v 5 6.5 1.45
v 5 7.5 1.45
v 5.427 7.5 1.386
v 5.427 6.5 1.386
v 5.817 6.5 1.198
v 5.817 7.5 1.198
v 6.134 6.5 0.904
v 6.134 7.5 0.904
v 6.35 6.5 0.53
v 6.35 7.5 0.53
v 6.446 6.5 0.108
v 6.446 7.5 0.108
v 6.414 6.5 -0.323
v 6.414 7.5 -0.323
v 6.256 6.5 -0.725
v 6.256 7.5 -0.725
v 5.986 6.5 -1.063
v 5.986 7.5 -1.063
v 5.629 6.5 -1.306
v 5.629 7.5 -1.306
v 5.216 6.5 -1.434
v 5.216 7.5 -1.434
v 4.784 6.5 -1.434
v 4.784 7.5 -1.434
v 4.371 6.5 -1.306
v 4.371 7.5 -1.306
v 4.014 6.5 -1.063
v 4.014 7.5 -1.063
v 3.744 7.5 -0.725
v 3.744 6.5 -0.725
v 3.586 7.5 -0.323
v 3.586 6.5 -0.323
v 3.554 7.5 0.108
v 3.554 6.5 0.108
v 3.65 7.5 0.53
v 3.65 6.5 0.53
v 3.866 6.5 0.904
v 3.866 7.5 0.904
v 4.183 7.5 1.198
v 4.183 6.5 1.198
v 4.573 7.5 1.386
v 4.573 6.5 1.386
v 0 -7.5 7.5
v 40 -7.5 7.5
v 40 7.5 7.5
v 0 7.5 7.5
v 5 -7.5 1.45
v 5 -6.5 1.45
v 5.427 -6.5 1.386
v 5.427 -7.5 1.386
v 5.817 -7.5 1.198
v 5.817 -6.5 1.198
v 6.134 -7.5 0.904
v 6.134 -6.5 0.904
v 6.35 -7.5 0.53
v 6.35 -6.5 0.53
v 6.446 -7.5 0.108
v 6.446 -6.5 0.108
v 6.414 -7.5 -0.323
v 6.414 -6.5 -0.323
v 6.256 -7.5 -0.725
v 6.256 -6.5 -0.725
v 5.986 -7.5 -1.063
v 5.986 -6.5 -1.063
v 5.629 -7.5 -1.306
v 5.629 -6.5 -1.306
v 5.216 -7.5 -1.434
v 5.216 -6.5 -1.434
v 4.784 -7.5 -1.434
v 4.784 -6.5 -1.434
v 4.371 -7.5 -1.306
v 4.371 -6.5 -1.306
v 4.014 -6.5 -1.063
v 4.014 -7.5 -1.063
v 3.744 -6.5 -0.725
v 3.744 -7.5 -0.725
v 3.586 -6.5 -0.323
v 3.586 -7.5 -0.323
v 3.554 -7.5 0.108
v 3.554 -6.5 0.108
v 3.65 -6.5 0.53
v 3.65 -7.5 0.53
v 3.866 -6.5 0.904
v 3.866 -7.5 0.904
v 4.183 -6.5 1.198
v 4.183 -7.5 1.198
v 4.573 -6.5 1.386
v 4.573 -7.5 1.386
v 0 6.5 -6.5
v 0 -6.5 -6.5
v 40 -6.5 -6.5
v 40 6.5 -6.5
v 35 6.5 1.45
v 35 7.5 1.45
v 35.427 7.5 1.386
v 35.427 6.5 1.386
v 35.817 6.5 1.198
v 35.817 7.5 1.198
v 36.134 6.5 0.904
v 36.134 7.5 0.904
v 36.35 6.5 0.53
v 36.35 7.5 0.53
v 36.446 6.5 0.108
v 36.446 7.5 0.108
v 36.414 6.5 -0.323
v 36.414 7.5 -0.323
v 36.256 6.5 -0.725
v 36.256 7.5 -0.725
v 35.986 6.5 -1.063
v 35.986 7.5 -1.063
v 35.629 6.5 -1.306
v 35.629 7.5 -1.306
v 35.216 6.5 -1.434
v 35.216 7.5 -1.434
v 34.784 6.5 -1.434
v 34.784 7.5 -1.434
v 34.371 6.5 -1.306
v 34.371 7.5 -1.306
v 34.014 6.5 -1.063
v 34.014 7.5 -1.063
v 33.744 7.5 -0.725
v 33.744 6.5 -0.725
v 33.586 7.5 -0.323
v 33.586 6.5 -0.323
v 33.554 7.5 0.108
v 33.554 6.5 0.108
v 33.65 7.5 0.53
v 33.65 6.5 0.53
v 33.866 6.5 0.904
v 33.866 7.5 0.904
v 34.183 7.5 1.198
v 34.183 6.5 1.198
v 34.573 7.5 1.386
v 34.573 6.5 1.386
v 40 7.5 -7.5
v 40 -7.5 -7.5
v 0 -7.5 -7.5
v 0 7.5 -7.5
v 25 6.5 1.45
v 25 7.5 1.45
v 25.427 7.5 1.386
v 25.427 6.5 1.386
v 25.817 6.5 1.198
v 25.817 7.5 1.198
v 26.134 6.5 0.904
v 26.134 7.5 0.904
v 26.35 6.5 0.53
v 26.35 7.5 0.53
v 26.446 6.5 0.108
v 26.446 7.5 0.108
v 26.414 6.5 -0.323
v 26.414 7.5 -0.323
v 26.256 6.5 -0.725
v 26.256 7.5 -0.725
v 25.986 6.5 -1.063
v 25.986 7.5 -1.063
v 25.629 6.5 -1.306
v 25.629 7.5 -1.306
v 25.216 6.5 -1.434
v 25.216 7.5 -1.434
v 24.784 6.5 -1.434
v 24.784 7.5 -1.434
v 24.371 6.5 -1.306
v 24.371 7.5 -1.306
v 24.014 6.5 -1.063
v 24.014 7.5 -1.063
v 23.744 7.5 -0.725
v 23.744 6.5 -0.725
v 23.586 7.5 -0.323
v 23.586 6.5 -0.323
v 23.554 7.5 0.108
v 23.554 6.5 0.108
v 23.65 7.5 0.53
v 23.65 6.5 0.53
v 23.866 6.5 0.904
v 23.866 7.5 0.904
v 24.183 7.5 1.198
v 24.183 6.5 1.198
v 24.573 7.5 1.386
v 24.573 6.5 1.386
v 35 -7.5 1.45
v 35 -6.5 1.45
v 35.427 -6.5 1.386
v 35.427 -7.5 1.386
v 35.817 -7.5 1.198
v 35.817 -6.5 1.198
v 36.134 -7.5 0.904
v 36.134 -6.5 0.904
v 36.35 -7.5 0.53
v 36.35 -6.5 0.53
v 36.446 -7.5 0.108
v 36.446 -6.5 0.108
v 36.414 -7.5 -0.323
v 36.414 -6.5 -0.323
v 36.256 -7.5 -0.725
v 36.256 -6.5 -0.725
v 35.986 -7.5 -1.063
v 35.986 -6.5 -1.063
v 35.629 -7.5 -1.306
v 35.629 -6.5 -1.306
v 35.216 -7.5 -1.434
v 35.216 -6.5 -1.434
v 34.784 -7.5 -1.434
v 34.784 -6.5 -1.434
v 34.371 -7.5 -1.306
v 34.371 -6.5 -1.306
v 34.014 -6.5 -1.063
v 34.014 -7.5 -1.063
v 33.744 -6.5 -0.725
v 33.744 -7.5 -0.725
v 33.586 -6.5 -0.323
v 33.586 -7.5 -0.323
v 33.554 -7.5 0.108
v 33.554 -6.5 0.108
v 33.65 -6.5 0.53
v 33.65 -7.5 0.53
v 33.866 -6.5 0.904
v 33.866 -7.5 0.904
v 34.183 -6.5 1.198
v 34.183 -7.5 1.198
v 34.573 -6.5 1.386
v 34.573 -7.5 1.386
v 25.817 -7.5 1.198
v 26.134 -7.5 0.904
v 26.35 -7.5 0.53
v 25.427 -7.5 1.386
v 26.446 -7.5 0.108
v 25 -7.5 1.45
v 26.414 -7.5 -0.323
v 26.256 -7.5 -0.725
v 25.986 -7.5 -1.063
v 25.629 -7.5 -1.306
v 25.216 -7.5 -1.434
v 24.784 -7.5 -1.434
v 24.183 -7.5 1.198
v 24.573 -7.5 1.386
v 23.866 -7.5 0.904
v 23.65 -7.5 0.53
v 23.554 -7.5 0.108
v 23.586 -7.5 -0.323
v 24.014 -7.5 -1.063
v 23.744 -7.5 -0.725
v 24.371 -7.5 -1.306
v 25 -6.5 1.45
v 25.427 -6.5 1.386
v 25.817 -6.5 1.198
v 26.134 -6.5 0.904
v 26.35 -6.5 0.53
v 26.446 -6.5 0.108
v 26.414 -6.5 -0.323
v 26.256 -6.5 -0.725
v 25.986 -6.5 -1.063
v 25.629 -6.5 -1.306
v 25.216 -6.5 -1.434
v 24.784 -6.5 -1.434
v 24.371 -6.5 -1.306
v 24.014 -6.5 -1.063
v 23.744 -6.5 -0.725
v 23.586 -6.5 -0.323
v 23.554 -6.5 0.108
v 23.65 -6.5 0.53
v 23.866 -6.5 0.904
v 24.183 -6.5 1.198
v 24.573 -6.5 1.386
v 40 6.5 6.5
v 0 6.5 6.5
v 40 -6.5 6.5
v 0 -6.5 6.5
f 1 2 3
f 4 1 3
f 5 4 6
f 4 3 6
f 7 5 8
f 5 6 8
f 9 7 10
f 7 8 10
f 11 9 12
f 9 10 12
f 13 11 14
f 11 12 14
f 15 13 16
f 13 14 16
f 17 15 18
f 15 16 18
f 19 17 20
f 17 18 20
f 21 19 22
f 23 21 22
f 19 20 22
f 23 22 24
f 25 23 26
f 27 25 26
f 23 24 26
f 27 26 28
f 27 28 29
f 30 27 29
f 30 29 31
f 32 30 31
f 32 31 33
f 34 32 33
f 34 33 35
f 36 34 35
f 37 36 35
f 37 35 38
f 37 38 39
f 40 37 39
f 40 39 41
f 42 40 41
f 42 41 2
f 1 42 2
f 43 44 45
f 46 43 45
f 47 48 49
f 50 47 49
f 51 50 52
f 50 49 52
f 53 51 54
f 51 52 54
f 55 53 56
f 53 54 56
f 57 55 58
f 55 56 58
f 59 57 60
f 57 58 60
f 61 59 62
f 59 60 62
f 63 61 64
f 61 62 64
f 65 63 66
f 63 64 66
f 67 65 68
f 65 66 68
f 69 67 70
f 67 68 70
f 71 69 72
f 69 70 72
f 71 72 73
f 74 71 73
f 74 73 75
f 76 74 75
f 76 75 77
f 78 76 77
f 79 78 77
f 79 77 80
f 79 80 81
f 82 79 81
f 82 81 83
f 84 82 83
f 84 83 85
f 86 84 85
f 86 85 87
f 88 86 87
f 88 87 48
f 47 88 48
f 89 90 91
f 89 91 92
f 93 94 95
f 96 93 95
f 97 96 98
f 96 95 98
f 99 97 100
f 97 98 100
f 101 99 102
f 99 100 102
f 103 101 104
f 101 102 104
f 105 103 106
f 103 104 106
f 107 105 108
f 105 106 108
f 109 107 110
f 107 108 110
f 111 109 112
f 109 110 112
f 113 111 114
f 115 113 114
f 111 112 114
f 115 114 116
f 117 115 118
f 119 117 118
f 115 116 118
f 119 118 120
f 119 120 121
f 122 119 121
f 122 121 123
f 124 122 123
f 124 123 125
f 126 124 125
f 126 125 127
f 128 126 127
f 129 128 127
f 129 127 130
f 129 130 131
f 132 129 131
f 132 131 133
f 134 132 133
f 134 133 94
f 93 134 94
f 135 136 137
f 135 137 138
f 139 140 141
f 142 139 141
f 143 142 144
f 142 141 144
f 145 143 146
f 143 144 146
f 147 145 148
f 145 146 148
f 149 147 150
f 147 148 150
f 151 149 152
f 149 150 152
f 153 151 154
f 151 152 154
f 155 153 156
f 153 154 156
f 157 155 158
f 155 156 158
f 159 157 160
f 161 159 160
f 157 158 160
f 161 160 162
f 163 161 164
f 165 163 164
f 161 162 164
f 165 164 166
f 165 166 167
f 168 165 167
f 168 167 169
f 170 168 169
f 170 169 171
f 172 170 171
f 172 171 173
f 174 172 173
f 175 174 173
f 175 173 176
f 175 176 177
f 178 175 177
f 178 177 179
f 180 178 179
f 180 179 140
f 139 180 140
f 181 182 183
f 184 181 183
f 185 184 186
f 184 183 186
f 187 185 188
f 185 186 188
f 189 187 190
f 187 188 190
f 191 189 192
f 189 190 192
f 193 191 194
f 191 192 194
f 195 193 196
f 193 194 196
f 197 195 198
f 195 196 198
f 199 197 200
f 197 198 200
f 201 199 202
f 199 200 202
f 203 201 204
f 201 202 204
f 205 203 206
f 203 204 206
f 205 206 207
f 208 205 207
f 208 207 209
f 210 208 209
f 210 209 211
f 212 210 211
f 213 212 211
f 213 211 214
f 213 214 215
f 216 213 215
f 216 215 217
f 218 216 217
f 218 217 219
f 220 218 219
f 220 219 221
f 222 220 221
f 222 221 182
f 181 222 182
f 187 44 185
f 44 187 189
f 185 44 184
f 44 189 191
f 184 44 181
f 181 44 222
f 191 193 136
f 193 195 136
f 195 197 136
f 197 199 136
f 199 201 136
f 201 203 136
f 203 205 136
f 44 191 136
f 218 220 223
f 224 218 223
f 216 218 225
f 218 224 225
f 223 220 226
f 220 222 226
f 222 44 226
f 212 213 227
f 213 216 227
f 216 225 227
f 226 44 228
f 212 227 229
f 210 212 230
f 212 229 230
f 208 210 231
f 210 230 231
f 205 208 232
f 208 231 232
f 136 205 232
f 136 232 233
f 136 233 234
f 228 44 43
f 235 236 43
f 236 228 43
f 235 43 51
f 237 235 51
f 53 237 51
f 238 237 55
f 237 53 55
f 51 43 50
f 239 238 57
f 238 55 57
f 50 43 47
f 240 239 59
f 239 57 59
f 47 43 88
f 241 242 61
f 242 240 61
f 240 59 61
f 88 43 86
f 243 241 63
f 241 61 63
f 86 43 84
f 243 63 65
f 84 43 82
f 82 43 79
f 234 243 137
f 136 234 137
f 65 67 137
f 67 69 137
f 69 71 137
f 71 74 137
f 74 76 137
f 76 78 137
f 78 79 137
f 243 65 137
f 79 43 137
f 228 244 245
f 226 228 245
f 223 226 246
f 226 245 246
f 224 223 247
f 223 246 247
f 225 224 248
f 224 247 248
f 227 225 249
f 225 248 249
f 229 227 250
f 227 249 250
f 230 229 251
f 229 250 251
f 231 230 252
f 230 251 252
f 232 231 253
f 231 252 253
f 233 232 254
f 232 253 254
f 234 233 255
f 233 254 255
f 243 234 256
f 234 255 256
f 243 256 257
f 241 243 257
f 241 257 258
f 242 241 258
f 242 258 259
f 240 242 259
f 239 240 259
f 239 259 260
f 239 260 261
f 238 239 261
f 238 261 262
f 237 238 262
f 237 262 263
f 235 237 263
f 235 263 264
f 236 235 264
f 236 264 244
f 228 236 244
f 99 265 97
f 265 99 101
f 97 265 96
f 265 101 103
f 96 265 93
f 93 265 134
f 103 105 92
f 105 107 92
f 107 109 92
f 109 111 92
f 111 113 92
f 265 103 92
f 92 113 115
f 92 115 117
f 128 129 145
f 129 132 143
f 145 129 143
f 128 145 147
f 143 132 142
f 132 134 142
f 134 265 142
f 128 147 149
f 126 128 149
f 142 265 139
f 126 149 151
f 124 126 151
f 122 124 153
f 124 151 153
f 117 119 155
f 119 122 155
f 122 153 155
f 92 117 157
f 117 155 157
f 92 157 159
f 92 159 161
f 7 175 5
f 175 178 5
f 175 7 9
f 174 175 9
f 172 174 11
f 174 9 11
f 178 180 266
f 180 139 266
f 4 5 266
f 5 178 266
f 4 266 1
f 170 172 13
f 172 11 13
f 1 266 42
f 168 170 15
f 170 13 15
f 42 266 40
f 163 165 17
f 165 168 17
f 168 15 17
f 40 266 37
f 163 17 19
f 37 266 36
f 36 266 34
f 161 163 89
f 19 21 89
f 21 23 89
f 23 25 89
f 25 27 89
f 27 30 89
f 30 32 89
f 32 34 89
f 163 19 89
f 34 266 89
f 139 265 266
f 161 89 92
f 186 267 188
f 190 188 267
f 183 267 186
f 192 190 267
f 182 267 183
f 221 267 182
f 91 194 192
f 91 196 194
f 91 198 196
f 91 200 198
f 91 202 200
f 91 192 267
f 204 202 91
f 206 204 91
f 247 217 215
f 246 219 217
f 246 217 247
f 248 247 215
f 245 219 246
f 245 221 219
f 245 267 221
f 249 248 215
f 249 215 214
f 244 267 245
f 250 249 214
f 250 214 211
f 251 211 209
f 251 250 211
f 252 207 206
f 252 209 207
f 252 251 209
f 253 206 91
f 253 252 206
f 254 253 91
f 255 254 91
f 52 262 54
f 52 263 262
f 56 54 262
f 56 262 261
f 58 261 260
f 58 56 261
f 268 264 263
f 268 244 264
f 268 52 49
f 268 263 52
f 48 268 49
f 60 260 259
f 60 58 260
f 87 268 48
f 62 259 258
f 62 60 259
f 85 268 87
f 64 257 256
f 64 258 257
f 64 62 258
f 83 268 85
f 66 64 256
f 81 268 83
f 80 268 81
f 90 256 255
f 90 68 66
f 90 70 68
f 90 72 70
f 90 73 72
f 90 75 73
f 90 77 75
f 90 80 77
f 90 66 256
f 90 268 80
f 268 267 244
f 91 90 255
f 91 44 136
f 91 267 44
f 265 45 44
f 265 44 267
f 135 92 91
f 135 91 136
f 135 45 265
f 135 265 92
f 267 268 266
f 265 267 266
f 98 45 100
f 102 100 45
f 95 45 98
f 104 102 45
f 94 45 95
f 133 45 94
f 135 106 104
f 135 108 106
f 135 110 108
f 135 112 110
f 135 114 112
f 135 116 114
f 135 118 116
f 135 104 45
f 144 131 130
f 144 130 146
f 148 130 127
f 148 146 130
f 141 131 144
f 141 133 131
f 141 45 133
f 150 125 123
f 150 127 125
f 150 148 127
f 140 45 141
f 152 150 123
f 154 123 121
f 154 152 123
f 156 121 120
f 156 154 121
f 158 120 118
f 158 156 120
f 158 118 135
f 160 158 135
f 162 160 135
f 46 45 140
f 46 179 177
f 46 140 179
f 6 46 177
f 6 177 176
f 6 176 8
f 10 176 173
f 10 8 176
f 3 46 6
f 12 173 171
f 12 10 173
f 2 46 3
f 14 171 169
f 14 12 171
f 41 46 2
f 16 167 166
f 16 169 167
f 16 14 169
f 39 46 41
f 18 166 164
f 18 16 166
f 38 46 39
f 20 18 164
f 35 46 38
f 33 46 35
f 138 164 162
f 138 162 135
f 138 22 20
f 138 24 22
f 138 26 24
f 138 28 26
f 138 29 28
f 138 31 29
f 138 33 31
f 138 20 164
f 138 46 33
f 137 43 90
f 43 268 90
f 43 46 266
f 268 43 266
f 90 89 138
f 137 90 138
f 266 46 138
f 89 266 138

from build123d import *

# Parameters (mm, degrees)
SKETCH_1_W          = 15
SKETCH_1_H          = 15
SKETCH_1_W_2        = 13
SKETCH_1_H_2        = 13
EXTRUDE_1_DEPTH     = 40
SKETCH_2_R          = 1.45
CUT_EXTRUDE_1_DEPTH = 44.373378932


with BuildPart() as part:
    # 草图1 → 凸台-拉伸1 (new body)
    with BuildSketch(Plane(origin=(0, 0, 0), x_dir=(0, 0, -1), z_dir=(1, 0, 0))):
        Rectangle(SKETCH_1_W, SKETCH_1_H)
        Rectangle(SKETCH_1_W_2, SKETCH_1_H_2, mode=Mode.SUBTRACT)
    extrude(amount=EXTRUDE_1_DEPTH)

    # 草图2 → 切除-拉伸1 (cut, through all)
    with BuildSketch(Plane(origin=(0, 7.5, 0), x_dir=(1, 0, 0), z_dir=(0, 1, 0))):
        with Locations(Location((5, 0, 0), (0, 0, 270))):
            Circle(SKETCH_2_R)
        with Locations(Location((25, 0, 0), (0, 0, 270))):
            Circle(SKETCH_2_R)
        with Locations(Location((35, 0, 0), (0, 0, 270))):
            Circle(SKETCH_2_R)
    extrude(amount=-CUT_EXTRUDE_1_DEPTH, mode=Mode.SUBTRACT)


solid = part.part
